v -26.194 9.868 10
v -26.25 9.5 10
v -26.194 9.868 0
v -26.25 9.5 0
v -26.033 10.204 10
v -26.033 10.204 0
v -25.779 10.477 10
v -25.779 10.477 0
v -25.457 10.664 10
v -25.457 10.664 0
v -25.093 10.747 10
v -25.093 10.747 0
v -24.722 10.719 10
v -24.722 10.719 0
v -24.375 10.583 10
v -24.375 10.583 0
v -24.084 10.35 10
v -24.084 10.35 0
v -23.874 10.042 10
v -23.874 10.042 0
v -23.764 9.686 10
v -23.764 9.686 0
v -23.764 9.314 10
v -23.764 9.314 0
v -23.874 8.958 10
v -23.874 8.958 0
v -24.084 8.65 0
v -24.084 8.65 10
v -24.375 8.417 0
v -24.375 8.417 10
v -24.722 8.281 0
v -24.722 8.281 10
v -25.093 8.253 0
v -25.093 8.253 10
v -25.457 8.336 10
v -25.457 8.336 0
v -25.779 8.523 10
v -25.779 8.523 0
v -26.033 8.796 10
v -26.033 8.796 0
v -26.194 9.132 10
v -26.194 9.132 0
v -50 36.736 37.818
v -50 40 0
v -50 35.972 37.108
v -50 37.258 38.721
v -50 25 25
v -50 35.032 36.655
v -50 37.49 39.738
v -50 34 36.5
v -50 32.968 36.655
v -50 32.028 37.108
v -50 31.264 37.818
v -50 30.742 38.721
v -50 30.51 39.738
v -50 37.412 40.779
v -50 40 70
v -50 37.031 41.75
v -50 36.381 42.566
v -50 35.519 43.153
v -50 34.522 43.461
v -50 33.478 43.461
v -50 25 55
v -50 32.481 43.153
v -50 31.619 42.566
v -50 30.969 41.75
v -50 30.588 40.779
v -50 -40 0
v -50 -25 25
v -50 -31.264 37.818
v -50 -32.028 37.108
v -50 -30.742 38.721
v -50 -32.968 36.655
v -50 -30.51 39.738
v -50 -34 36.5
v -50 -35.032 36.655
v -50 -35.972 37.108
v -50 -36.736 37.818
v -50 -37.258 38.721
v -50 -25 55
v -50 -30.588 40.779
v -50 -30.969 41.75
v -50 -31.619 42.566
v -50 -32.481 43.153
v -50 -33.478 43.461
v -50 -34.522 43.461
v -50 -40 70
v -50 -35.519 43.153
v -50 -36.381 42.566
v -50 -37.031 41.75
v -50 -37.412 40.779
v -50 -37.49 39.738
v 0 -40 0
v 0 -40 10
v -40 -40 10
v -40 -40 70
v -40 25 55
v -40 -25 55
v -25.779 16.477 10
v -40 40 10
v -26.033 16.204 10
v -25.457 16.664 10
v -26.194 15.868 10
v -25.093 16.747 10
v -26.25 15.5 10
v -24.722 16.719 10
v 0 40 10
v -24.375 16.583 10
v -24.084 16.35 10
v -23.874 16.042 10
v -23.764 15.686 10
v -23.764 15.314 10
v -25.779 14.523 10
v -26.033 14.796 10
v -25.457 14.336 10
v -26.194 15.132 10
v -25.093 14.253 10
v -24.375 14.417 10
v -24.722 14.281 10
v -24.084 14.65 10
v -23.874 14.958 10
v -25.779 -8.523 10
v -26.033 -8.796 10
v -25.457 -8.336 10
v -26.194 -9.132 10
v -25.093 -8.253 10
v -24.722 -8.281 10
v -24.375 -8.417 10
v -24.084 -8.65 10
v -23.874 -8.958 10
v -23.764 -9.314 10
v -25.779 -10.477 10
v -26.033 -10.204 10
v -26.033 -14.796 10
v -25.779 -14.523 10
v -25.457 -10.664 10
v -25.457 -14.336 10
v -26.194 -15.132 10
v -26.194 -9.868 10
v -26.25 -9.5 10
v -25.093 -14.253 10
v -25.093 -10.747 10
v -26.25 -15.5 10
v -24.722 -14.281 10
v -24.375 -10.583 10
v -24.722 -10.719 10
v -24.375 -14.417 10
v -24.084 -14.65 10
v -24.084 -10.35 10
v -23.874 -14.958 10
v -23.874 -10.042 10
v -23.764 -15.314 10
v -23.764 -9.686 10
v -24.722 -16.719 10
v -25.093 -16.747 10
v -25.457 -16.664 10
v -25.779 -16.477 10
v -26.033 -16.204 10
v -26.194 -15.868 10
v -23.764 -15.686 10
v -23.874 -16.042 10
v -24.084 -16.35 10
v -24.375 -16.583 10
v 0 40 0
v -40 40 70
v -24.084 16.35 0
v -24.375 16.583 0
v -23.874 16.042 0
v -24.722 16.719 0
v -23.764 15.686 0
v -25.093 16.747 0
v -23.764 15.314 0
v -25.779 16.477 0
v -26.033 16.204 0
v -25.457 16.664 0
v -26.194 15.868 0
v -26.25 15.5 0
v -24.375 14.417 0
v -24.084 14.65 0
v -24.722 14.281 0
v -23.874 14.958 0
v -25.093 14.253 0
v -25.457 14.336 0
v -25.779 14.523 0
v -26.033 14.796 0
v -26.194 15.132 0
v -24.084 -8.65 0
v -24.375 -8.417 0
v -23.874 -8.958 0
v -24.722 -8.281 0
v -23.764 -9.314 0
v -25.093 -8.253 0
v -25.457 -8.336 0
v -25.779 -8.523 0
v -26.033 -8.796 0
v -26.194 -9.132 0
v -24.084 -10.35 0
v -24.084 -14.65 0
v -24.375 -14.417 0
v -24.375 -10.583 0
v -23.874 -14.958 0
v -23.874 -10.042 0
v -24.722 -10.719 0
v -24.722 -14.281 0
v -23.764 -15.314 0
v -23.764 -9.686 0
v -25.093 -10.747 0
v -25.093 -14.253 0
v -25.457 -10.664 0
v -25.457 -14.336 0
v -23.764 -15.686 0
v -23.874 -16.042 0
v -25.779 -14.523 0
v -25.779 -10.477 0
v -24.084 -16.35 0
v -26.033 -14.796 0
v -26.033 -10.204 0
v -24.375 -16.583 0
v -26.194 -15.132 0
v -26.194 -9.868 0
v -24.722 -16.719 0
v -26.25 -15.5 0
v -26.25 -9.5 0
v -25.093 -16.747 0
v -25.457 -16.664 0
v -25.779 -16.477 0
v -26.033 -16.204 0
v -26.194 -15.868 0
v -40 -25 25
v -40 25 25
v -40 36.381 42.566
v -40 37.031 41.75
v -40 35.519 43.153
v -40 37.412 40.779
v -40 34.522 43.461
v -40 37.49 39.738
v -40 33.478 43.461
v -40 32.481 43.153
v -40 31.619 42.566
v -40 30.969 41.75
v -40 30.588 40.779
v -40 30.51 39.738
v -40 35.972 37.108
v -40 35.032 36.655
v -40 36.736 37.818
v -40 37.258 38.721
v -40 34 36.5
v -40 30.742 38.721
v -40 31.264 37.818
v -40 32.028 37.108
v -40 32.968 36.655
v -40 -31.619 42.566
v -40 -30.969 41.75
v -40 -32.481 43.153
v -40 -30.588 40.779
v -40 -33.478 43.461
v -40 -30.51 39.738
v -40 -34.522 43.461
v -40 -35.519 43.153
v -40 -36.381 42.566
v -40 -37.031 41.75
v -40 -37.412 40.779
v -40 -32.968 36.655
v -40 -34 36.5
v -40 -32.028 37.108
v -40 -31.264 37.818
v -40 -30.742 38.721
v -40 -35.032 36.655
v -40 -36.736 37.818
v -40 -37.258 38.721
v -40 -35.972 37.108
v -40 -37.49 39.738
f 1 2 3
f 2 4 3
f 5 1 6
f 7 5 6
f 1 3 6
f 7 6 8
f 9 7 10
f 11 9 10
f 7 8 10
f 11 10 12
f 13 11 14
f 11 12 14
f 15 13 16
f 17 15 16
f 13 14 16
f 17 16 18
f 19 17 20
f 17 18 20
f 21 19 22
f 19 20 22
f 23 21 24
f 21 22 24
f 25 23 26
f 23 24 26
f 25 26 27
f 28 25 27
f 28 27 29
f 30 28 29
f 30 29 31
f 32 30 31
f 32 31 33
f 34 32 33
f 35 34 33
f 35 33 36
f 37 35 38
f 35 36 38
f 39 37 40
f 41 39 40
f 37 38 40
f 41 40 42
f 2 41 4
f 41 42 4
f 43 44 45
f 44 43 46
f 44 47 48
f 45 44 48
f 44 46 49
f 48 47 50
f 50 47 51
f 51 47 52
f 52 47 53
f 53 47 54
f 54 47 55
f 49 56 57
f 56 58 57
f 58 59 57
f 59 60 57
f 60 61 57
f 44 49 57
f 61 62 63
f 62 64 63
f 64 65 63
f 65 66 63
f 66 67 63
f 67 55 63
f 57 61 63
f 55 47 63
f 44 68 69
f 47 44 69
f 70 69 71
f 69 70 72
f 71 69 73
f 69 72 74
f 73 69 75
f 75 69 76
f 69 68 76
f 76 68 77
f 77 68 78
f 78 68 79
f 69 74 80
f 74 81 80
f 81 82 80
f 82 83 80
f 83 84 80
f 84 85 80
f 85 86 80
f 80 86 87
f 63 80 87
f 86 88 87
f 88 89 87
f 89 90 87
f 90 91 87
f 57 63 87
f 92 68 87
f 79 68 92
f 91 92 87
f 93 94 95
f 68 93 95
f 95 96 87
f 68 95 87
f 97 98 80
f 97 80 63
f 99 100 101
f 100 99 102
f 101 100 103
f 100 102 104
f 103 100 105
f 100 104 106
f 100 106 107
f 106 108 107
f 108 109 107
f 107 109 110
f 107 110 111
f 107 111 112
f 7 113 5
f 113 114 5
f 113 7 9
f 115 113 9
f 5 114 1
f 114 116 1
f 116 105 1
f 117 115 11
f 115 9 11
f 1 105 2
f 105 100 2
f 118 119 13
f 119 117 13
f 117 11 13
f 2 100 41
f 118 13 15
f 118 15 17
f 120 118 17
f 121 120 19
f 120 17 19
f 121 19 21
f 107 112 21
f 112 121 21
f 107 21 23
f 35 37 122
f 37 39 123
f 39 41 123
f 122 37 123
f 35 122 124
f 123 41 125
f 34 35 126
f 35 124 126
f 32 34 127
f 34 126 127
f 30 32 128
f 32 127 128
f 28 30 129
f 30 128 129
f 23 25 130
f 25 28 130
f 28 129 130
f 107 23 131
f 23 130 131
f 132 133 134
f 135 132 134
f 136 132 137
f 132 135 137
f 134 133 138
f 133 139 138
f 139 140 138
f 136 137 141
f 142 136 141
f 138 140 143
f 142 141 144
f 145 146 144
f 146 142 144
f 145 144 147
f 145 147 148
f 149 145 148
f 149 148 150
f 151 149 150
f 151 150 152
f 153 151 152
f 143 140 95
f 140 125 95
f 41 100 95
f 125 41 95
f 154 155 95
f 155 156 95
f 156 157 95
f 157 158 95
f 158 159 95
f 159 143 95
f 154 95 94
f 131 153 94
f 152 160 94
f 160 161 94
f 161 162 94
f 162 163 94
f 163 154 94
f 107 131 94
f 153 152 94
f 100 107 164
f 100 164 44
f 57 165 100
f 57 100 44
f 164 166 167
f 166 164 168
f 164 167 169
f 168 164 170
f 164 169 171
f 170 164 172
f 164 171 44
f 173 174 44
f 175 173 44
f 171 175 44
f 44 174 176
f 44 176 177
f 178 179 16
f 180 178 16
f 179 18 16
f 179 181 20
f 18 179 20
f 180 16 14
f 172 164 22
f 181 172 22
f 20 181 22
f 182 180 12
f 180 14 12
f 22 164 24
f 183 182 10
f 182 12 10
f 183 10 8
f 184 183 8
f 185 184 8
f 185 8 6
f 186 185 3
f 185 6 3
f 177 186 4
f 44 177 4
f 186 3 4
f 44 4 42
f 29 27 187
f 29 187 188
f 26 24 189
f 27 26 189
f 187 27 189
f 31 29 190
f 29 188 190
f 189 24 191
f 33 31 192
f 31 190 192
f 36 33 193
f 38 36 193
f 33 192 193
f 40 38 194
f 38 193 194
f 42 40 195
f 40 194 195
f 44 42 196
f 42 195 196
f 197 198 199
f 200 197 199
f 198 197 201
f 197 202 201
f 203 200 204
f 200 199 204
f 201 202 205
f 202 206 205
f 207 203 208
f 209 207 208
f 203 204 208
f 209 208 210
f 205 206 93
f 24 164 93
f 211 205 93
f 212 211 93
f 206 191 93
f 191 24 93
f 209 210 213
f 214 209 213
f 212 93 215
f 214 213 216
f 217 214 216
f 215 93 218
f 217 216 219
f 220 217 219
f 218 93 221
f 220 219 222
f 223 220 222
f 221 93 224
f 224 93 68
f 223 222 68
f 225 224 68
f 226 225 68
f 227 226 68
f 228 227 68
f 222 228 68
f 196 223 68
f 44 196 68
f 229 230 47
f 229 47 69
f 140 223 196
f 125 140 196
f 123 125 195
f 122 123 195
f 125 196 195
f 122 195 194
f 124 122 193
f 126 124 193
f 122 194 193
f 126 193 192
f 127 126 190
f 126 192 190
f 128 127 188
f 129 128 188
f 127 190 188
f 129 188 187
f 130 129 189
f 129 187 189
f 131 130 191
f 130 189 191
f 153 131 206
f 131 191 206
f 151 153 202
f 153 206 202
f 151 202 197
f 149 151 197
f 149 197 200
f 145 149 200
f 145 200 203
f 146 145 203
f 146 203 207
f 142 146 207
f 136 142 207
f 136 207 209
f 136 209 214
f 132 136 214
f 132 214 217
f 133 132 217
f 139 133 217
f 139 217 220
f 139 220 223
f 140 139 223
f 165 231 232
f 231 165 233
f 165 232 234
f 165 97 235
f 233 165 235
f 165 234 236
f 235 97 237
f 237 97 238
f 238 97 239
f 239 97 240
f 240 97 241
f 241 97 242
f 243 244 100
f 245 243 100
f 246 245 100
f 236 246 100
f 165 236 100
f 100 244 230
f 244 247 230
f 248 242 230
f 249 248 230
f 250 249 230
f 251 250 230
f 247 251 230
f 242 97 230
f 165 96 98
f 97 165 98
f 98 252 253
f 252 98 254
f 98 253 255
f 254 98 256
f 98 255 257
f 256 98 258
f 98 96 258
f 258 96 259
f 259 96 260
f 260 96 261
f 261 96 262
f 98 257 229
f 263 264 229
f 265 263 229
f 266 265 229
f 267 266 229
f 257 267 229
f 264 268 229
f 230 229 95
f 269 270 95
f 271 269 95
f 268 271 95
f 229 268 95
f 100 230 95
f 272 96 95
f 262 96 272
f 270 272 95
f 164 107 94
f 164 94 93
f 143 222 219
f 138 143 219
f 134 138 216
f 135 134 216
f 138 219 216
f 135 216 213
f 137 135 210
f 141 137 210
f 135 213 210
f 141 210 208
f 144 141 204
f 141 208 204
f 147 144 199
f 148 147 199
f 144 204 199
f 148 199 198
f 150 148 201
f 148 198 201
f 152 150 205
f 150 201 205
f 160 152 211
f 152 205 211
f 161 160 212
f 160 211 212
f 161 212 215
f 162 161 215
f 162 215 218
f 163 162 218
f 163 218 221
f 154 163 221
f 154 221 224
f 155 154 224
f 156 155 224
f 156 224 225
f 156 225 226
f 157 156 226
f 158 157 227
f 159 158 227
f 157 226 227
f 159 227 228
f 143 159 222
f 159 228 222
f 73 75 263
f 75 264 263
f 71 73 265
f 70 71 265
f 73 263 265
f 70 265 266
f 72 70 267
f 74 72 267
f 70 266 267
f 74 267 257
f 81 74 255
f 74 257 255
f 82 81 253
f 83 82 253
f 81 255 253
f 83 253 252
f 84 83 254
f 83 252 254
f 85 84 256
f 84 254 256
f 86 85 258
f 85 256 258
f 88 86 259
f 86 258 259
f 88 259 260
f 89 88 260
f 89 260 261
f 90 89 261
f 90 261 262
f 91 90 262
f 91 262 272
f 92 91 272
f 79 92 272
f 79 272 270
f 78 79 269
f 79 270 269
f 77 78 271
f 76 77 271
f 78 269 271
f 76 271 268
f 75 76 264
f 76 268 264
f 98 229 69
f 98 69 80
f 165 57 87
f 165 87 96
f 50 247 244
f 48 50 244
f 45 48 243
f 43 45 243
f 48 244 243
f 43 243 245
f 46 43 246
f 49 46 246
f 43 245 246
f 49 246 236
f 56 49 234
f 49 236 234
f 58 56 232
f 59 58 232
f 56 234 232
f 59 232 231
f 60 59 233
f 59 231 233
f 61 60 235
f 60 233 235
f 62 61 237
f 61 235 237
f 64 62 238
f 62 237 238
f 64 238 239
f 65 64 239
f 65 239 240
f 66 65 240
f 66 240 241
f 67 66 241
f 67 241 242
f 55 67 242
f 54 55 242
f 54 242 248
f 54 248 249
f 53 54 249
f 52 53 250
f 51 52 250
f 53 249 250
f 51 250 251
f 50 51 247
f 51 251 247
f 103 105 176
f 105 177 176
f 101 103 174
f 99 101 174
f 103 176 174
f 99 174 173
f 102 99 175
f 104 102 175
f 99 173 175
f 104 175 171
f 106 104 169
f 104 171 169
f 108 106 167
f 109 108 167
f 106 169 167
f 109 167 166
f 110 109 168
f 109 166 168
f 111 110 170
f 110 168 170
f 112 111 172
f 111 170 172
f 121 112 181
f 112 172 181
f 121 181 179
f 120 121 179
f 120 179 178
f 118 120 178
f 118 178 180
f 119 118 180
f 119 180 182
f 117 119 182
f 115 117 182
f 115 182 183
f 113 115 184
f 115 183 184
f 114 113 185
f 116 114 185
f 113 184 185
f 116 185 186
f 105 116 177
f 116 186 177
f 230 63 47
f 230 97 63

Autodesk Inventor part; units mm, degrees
ref_plane "YZ Plane" through (0, 0, 0) normal (1, 0, 0) x (0, 1, 0)
ref_plane "XZ Plane" through (0, 0, 0) normal (0, 1, 0) x (-1, 0, 0)
ref_plane "XY Plane" through (0, 0, 0) normal (0, 0, 1) x (1, 0, 0)
sketch "Sketch1" plane through (0, 0, 0) normal (0, 1, 0) x (-1, 0, 0)
  line L0 (0, 0) -> (50, 0)
  line L1 (50, 0) -> (50, 3.3201)
  line L2 (40, 10) -> (0, 10)
  line L3 (0, 10) -> (0, 0)
  line L4 (50, 70) -> (40, 70)
  line L5 (40, 70) -> (40, 10)
  line L6 (50, 3.3201) -> (50, 70)
  dimension "d0" = 50
  dimension "d1" = 70
  dimension "d2" = 10
  dimension "d3" = 10
extrude "Extrusion1" add sketch "Sketch1" along normal mid plane 80
sketch "Sketch2" plane through (-40, -40, 10) normal (1, 0, 0) x (0, 0, -1)
  line L0 (-45, 65) -> (-15, 65)
  line L1 (-15, 65) -> (-15, 15)
  line L2 (-15, 15) -> (-45, 15)
  line L3 (-45, 15) -> (-45, 65)
  line L4 (-60, 80) -> (0, 80) projected
  line L5 (-60, 0) -> (-60, 80) projected
  point P0 (10, 40)
  dimension "d6" = 30
  dimension "d7" = 50
  dimension "d8" = 15
  dimension "d9" = 15
extrude "Extrusion2" cut sketch "Sketch2" against normal through all
sketch "Sketch3" plane through (-40, -40, 10) normal (1, 0, 0) x (0, 0, -1)
  circle A0 centre (-30, 74) radius 3.5
  circle A1 centre (-30, 6) radius 3.5
  line L0 (-60, 0) -> (-60, 80) projected
  line L1 (-60, 80) -> (0, 80) projected
  point P0 (10, 40)
  dimension "d12" = 7
  dimension "d13" = 7
  dimension "d14" = 30
  dimension "d15" = 68
  dimension "d16" = 6
  dimension "d17" = 30
extrude "Extrusion3" cut sketch "Sketch3" against normal through all
sketch "Sketch4" plane through (0, 40, 0) normal (0, 0, -1) x (-1, 0, 0)
  circle A0 centre (25, -24.5) radius 1.25
  circle A1 centre (25, -30.5) radius 1.25
  circle A2 centre (25, -49.5) radius 1.25
  circle A3 centre (25, -55.5) radius 1.25
  line L0 (0, -80) -> (0, 0) projected
  line L1 (50, -80) -> (0, -80) projected
  point P0 (0, -40)
  dimension "d20" = 2.5
  dimension "d21" = 31
  dimension "d22" = 19
  dimension "d23" = 6
  dimension "d24" = 6
  dimension "d25" = 25
  dimension "d26" = 24.5
  dimension "d32" = 2.5
  dimension "d33" = 2.5
  dimension "d34" = 2.5
  dimension "d35" = 55.5
  dimension "d36" = 49.5
extrude "Extrusion4" cut sketch "Sketch4" against normal through all
properties part number "L-bracket"
